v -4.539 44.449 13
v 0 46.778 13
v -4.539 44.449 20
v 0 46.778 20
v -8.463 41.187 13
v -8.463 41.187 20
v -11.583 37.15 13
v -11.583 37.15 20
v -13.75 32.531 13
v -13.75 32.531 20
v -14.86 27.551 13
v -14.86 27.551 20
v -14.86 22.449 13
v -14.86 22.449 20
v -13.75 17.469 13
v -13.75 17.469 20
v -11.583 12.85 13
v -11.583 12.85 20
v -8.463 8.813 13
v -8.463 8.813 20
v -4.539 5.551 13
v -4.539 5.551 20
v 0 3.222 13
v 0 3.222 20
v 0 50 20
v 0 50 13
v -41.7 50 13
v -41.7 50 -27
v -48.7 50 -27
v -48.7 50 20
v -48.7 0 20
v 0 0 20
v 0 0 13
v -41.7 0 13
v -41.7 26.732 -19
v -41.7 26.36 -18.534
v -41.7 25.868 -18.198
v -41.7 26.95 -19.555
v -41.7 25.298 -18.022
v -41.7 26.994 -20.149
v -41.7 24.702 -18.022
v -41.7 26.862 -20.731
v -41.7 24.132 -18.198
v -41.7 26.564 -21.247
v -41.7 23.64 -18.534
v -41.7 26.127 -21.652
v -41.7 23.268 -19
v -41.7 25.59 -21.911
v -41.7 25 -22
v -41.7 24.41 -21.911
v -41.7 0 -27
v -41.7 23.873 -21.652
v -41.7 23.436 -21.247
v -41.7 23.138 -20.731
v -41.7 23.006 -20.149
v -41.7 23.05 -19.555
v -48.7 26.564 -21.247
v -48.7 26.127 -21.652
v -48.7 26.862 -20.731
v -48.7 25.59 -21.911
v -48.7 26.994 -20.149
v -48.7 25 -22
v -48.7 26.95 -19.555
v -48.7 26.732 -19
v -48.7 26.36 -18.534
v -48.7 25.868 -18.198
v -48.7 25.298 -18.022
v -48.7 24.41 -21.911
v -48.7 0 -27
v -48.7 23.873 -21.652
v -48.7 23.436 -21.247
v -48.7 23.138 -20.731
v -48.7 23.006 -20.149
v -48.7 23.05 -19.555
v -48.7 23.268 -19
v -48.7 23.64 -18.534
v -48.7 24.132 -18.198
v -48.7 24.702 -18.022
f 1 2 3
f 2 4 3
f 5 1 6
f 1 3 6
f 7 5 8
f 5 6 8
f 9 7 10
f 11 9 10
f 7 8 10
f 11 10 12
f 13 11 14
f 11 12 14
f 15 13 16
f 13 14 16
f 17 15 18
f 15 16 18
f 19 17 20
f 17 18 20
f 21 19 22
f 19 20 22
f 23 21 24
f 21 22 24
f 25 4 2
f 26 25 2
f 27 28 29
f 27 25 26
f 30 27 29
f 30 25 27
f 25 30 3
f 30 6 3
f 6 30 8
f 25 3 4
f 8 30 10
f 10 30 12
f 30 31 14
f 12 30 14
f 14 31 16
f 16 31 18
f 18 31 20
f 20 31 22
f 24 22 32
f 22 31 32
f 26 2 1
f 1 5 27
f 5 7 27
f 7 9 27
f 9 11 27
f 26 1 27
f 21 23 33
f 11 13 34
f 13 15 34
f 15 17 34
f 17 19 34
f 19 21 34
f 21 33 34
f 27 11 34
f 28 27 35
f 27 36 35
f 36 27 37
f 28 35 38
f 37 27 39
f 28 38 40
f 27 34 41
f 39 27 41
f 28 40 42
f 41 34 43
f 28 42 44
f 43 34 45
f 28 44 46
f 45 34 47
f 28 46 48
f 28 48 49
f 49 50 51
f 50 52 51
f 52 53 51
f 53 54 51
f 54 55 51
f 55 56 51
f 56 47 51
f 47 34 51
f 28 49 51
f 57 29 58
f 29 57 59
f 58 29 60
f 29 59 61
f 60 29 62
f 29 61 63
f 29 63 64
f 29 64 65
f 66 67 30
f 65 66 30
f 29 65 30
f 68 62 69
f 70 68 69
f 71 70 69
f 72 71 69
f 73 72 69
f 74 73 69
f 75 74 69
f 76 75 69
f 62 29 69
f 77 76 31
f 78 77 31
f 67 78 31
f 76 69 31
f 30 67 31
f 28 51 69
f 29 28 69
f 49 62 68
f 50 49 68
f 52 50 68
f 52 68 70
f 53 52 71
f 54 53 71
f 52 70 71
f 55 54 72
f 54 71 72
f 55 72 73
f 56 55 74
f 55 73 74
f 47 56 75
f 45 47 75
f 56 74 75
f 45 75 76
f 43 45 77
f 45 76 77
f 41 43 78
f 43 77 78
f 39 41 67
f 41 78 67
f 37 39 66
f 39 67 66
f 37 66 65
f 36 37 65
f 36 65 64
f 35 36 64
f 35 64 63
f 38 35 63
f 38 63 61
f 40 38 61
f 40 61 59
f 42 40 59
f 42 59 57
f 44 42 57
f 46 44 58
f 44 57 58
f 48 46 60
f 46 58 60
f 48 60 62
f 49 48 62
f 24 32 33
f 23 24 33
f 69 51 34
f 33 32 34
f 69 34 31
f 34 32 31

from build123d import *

# Parameters (mm, degrees)
PAD_DEPTH       = 50
SKETCH001_R     = 23.31
POCKET_DEPTH    = 7
SKETCH002_R     = 2
POCKET001_DEPTH = 7


with BuildPart() as part:
    # Sketch → Pad (new body)
    with BuildSketch(Plane.XZ):
        Polygon((-41.7, -27), (-48.7, -27), (-48.7, 20), (0, 20), (0, 13), (-41.7, 13), align=None)
    extrude(amount=-PAD_DEPTH)

    # Sketch001 → Pocket (cut)
    with BuildSketch(Plane(origin=(0, 0, 20), x_dir=(-1, 0, 0), z_dir=(0, 0, 1))):
        with Locations((-8.31, -25)):
            Circle(SKETCH001_R)
    extrude(amount=-POCKET_DEPTH, mode=Mode.SUBTRACT)

    # Sketch002 → Pocket001 (cut)
    with BuildSketch(Plane(origin=(-48.7, 0, 0), x_dir=(0, 0, -1), z_dir=(-1, 0, 0))):
        with Locations((20, -25)):
            Circle(SKETCH002_R)
    extrude(amount=-POCKET001_DEPTH, mode=Mode.SUBTRACT)


solid = part.part
